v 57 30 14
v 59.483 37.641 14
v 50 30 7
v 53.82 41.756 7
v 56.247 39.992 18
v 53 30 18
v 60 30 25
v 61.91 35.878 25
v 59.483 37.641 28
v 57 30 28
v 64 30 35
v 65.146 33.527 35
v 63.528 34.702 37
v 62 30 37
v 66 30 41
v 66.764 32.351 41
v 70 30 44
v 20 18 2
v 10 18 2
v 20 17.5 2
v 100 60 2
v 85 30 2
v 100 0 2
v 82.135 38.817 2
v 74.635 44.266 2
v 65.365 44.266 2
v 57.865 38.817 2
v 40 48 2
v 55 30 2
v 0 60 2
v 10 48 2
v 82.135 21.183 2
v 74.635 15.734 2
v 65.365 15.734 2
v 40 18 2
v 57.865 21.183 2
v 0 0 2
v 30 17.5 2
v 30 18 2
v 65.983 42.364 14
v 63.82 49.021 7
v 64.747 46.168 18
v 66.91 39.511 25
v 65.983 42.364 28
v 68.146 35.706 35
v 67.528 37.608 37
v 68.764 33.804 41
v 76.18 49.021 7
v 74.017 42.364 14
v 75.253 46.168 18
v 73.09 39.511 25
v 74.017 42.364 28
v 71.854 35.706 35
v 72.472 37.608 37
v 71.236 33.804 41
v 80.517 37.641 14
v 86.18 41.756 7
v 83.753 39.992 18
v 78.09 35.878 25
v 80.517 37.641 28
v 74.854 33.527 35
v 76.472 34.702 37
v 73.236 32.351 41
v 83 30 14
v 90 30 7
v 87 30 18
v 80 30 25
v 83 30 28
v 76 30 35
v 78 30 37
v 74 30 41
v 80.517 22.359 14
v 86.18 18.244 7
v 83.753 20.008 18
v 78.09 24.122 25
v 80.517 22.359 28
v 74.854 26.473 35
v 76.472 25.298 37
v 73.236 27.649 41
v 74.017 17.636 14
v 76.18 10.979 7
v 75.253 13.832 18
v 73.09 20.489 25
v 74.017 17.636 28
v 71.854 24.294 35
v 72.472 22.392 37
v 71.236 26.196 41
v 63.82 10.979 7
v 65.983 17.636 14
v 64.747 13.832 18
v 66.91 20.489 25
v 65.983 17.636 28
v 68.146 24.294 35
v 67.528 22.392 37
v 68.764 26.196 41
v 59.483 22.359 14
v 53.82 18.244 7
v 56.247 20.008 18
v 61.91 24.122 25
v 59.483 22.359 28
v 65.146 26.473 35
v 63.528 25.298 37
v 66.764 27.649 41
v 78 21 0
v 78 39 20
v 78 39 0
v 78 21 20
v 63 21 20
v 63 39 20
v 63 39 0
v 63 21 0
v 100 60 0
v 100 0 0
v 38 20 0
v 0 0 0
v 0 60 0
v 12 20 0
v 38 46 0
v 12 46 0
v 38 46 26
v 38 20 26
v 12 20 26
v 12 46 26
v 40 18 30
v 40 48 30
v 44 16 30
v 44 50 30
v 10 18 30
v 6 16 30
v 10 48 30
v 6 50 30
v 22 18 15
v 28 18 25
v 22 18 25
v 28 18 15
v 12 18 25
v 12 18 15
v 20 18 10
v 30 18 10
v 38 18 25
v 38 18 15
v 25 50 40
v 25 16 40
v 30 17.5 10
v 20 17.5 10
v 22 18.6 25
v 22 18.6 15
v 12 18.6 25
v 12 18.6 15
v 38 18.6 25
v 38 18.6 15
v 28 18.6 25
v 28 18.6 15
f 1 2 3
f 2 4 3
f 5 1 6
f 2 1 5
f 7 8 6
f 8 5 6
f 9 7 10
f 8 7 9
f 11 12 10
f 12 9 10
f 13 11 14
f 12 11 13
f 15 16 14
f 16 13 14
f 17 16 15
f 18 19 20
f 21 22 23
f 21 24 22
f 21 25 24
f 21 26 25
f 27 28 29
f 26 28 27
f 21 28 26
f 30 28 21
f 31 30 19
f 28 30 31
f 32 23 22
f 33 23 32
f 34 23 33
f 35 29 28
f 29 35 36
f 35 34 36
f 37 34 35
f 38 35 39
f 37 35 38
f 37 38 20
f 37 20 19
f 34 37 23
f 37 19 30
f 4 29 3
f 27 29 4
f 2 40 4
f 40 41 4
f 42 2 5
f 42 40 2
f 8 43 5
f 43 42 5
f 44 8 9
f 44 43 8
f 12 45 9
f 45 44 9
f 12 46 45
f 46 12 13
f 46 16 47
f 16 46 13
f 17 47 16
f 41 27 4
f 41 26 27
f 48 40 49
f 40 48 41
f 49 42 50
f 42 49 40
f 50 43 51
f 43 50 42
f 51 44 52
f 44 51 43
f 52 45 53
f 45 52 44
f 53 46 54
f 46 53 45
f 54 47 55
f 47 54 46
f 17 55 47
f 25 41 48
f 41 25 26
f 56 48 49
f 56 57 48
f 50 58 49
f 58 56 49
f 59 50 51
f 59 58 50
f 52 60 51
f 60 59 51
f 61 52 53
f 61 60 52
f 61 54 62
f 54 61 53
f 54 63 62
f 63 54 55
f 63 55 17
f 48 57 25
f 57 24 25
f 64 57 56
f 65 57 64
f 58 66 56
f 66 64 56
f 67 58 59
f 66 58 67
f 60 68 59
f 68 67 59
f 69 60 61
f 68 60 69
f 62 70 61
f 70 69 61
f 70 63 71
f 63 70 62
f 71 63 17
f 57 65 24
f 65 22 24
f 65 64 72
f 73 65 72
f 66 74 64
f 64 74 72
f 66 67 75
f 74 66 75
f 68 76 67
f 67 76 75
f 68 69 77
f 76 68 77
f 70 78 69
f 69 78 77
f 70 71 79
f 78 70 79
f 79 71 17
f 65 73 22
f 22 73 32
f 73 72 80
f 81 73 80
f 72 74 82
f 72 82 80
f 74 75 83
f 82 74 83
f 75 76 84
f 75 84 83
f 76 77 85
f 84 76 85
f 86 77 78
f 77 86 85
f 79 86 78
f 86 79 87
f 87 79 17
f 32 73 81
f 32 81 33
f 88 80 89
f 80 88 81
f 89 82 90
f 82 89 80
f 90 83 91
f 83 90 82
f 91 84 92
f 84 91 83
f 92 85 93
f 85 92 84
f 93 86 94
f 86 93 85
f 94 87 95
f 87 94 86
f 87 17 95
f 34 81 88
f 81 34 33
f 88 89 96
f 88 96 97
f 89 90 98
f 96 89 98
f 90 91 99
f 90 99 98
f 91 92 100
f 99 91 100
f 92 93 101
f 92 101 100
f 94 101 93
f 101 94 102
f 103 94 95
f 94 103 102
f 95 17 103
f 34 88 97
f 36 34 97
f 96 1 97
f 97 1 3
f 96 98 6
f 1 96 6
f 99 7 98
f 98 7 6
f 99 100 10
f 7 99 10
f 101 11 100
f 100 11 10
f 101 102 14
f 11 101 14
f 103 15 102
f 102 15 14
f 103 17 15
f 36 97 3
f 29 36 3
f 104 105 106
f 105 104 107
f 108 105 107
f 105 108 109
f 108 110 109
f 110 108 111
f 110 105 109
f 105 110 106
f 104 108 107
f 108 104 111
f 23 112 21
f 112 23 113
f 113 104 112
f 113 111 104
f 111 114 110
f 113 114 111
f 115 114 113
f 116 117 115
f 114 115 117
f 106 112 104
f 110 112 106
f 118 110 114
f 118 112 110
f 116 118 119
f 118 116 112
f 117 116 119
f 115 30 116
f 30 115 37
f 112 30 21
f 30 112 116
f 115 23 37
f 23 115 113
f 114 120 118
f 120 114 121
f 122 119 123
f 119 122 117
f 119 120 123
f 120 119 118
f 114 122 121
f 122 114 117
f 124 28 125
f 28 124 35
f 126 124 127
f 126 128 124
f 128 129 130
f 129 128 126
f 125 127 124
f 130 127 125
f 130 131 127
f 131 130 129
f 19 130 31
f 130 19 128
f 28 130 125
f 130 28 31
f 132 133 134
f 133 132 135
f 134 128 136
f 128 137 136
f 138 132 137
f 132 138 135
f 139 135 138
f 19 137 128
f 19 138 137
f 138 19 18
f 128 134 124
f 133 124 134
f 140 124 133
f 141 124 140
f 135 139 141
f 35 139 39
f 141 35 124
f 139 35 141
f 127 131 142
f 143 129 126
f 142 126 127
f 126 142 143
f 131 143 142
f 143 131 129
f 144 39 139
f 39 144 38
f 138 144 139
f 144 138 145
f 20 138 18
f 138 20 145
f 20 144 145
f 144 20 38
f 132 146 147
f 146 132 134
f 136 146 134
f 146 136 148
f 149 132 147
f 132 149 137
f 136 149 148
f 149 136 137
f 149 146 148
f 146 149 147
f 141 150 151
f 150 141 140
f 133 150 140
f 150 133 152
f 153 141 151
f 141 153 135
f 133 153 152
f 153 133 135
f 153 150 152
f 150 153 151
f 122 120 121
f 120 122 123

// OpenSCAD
/**
 * Snowlite Scene
 */
 
 module snowlite_scene() {
     
     union() {
         
         // tree
         difference() {
             
            translate([70,30,2])
            rotate_extrude($fn=10) {

            translate([-15,0,0])
                polygon(points = [[30,0], [35,5], [28,12], [32,16], [25,23], [28,26], 
                                  [21,33], [23,35], [19,39], [15,42], [15,0]], convexity = 1);
            }
            
            // cut-out for tree
            translate([63,21,-2])
            cube([15,18,22]); 
         }
         
        // ground
        difference() {
         
            cube(size = [100,60,2]);
         
            translate([12,20,-4])
            cube(size = [26,26,30]);
            
            translate([63,21,-2])
            cube([15,18,22]);
         
        }
        
        // house
        // translation of the first house
        translate([10,18,0])
        
        difference() {
         
         
            union() {

            // house body
            cube(size = [30,30,30]);
         
            // house roof
            translate([0,32,0]) {
                rotate([90,0,0]) {
                    linear_extrude(34) {
                        polygon(points = [[-4, 30], [15,40], [34,30]], convexity = 1);
                    }
                }
            }
        
            // house door
            translate([10,-0.5,0]) {
                cube(size = [10,0.5,10]);
            }
        }
         
         
         // house windows
        translate([2,-0.1,15]) {
            cube(size = [10,0.7,10]);
        }
        
        translate([18,-0.1,15]) {
            cube(size = [10,0.7,10]);
        }
        
        translate([2,2,-4])
        cube(size = [26,26,30]);
        
        } 
    } 
 }
 
 /**
 * Preview
 */
snowlite_scene_preview = true;
if (snowlite_scene_preview) {
    $fn = 64;
    snowlite_scene();
}
